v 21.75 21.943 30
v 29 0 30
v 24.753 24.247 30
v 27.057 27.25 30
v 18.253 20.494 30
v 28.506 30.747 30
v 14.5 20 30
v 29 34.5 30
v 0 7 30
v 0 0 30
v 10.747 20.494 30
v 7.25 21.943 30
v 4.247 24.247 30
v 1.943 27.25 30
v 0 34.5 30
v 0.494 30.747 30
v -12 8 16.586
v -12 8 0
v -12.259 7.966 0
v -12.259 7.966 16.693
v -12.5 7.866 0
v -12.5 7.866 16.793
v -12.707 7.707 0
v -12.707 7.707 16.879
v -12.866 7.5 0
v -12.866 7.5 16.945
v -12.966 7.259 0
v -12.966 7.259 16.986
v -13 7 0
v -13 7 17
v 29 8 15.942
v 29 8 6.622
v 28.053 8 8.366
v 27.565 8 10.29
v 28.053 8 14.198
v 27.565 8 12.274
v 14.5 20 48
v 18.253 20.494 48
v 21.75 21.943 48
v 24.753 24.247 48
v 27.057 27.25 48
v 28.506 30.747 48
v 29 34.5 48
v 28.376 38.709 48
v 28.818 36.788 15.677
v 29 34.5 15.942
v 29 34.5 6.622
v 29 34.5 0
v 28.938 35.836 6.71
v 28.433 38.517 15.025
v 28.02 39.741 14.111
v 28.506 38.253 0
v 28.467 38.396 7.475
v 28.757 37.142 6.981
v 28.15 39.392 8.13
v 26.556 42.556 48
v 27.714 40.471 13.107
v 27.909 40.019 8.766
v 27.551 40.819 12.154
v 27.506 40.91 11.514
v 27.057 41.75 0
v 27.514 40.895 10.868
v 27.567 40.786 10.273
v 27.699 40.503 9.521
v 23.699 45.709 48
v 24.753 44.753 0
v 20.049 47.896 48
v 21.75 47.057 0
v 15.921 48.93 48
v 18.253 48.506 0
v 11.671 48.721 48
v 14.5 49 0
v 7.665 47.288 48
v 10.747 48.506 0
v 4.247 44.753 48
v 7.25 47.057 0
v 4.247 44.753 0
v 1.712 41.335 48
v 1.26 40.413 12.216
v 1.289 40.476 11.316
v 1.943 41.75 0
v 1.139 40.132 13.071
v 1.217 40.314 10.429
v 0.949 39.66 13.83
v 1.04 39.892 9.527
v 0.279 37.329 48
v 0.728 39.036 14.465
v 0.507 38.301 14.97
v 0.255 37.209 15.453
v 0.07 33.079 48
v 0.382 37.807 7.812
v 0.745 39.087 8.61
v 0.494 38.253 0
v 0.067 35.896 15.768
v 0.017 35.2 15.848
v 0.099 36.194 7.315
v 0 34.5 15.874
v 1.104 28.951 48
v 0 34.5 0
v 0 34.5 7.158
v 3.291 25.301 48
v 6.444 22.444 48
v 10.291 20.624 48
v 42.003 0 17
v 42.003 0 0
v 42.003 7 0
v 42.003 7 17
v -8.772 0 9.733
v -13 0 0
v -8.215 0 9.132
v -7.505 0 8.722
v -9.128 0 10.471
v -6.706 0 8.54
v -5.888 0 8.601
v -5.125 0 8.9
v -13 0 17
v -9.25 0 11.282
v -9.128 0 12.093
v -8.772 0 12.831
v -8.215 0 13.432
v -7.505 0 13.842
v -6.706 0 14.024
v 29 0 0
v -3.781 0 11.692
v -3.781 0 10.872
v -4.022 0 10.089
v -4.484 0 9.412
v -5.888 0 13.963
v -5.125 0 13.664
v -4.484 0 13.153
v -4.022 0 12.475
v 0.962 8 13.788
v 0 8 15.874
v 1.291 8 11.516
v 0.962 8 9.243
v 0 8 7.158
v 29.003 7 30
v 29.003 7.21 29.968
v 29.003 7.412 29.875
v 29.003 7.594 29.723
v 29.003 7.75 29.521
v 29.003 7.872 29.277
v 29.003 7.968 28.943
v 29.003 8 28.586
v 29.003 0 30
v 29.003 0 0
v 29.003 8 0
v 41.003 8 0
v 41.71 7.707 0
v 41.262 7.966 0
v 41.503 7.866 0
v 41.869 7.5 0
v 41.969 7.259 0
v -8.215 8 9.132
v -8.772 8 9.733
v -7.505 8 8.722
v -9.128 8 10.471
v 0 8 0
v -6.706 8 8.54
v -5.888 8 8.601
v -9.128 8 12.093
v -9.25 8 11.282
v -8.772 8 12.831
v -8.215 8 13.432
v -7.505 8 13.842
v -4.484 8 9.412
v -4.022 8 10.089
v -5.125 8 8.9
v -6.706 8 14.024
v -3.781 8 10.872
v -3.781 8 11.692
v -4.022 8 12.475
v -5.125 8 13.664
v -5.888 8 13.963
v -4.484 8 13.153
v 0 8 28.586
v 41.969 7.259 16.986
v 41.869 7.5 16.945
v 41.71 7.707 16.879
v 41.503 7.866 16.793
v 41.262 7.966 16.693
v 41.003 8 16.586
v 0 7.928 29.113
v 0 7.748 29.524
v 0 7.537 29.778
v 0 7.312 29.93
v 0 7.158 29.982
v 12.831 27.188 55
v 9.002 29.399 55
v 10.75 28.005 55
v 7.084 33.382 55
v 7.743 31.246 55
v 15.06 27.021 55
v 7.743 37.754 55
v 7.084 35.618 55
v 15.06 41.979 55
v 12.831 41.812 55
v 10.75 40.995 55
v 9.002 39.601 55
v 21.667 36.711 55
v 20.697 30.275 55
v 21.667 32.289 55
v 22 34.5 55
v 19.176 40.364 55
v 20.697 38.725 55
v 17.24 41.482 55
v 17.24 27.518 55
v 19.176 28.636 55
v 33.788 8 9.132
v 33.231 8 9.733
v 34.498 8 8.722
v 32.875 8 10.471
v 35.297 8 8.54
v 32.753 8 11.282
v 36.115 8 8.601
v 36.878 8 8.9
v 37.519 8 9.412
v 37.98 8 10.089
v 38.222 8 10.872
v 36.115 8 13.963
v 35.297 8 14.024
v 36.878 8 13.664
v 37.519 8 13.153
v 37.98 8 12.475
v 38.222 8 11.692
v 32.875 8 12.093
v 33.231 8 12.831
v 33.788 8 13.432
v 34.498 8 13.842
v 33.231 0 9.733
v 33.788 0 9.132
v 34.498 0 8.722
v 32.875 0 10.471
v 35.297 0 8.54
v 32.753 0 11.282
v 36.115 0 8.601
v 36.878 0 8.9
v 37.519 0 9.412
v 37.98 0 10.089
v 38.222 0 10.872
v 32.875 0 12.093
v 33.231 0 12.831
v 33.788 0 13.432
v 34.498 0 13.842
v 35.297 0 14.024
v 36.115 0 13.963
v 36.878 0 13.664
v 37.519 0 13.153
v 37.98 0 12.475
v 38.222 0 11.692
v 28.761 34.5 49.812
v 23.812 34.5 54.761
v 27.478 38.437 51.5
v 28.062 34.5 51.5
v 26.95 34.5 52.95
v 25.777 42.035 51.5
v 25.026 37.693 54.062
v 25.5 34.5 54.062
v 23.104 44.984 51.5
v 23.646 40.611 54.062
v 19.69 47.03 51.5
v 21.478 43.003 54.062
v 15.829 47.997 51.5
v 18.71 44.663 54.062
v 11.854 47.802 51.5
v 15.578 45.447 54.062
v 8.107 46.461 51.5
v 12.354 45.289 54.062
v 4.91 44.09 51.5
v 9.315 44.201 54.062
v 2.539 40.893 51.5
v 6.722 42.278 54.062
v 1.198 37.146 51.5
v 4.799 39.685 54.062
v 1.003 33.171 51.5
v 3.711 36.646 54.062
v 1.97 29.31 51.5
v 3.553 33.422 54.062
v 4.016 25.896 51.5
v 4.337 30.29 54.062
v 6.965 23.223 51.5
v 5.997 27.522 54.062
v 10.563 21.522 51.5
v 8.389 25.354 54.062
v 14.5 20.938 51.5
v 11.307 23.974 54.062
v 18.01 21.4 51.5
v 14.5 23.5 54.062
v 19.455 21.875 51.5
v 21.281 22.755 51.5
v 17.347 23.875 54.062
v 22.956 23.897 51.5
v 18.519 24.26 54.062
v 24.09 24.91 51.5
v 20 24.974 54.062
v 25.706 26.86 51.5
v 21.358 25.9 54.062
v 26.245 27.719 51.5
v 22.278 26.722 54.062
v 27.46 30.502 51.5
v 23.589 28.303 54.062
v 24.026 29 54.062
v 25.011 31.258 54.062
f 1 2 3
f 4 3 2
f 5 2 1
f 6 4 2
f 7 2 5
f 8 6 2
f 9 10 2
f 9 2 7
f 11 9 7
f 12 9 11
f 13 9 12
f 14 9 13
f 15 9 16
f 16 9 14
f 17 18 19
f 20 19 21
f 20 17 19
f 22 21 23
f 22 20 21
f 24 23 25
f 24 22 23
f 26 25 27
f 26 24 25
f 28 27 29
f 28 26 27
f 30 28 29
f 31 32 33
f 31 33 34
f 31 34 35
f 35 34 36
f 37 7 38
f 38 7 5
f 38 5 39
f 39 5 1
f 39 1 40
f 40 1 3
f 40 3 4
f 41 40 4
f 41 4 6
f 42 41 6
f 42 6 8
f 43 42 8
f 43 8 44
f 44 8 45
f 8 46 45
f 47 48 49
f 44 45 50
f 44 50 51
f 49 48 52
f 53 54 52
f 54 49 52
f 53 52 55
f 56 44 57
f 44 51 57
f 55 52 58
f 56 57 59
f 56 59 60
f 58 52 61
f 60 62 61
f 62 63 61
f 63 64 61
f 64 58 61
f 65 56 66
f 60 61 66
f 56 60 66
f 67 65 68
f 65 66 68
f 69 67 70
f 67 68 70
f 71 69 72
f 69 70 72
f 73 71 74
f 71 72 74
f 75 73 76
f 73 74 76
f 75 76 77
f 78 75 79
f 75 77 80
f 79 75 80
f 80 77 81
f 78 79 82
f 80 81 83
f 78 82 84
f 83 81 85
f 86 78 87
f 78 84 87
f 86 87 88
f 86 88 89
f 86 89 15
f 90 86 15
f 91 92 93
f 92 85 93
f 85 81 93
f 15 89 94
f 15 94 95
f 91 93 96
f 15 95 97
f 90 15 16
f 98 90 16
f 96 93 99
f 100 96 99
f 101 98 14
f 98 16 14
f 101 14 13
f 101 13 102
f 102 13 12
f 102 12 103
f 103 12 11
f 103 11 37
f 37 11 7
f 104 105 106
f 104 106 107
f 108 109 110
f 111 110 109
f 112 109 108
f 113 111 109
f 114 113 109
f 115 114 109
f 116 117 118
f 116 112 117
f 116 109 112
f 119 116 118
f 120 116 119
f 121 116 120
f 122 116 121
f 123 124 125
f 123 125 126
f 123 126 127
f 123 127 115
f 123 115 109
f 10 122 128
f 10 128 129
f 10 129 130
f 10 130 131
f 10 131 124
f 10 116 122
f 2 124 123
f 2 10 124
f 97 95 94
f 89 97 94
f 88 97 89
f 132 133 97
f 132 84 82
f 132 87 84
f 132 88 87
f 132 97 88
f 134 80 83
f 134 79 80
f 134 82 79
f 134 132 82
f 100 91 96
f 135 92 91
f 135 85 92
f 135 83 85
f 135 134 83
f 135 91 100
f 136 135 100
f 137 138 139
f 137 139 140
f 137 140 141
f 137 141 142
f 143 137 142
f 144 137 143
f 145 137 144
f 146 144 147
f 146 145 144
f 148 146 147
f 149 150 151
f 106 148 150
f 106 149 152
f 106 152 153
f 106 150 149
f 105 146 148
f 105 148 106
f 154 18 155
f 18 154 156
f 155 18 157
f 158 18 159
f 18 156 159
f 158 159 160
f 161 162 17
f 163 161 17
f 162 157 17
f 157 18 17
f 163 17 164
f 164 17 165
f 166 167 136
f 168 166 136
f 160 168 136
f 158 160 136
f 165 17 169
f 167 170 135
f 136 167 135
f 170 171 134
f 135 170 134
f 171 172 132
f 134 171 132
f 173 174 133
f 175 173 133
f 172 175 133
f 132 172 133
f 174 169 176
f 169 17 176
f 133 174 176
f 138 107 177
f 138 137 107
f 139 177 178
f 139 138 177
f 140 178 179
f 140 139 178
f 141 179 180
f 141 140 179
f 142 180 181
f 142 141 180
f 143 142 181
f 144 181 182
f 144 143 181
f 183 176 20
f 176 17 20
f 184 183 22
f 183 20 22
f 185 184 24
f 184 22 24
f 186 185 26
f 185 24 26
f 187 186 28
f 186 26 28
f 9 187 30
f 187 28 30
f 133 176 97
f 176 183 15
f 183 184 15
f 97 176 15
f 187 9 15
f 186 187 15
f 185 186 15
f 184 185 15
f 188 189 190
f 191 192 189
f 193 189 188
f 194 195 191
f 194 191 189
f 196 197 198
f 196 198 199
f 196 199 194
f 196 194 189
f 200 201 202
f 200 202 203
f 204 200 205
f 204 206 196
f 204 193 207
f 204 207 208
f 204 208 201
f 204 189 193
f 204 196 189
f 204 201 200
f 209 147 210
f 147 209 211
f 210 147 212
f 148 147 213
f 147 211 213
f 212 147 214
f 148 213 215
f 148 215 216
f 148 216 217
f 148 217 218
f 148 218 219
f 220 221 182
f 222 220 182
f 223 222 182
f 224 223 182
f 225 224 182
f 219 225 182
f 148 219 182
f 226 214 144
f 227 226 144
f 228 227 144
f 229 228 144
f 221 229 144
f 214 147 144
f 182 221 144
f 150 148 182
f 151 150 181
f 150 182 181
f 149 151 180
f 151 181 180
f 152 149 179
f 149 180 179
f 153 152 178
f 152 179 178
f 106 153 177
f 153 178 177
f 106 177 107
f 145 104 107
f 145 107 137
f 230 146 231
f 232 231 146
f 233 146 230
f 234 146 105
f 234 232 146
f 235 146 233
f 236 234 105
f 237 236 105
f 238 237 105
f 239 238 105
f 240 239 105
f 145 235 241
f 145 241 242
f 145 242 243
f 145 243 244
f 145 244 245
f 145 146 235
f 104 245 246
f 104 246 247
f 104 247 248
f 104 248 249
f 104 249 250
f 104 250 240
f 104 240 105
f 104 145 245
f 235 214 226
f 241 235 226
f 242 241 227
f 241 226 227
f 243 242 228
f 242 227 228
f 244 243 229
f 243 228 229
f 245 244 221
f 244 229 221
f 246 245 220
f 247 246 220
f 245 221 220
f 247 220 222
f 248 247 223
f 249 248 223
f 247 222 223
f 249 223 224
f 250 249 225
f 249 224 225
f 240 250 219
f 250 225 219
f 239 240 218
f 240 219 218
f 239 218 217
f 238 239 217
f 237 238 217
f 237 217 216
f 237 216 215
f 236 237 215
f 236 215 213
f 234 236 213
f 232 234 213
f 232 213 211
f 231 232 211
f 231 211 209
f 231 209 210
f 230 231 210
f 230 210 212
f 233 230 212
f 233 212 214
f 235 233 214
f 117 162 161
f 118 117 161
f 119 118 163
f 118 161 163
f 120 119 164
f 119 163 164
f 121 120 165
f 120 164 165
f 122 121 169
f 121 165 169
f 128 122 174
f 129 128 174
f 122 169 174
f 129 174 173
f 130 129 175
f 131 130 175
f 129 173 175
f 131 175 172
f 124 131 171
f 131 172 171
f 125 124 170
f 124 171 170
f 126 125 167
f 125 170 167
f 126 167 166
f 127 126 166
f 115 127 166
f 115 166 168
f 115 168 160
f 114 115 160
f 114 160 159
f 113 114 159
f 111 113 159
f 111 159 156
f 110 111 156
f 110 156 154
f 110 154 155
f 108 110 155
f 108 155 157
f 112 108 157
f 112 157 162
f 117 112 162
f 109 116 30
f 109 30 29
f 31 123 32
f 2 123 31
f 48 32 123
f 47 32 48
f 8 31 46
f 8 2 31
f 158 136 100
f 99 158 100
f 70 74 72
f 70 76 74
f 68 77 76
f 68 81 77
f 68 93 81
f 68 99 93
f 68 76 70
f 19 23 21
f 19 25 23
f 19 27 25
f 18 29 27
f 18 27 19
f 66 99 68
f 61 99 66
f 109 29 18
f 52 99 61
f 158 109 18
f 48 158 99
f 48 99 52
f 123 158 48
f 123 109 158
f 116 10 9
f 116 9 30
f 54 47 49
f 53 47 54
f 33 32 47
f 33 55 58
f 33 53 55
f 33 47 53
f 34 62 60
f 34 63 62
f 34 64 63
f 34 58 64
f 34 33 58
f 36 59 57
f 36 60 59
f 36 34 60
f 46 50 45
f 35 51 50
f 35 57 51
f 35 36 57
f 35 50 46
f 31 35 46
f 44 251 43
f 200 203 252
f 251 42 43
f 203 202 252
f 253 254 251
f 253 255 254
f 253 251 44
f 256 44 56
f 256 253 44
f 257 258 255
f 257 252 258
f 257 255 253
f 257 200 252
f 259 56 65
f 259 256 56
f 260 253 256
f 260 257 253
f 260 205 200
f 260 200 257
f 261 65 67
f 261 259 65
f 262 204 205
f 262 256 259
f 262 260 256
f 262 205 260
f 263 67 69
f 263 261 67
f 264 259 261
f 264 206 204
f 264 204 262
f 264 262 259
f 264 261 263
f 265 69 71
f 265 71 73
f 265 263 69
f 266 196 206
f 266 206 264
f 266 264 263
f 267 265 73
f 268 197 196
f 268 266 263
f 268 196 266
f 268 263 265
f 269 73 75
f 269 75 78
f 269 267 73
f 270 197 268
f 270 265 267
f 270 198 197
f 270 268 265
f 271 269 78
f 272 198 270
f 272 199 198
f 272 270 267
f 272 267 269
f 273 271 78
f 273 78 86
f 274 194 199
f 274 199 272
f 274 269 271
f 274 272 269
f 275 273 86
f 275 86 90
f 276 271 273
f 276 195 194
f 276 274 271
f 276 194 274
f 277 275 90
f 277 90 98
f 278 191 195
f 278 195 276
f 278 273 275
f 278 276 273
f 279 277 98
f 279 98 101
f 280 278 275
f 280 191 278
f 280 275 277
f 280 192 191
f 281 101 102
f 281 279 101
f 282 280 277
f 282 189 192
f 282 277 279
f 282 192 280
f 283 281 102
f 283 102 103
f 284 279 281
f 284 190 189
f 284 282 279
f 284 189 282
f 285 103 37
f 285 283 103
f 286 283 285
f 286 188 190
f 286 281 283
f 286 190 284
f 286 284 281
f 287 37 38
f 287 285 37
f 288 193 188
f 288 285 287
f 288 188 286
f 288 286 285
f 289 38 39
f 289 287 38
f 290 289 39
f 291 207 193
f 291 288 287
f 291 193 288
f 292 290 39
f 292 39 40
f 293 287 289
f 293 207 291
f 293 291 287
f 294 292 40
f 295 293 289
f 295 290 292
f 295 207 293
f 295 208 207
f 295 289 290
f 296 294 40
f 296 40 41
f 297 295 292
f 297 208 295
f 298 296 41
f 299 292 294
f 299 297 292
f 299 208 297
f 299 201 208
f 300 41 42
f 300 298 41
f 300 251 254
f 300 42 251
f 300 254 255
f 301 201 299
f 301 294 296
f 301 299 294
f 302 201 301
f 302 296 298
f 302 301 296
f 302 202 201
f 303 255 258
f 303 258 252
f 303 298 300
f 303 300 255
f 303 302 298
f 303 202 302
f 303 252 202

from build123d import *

# Parameters (mm, degrees)
F0_W      = 49
F0_H      = 30
F1_DEPTH  = 29
F3_DEPTH  = 8
F5_DEPTH  = 25
F6_DEPTH  = 30
F8_R      = 2.75
F9_DEPTH  = 25
F10_R     = 8
F11_DEPTH = 40
F12_R     = 1
F12_2_R   = 1


# Not quite as in the source:
# - a fillet or chamfer that OpenCascade refuses, or shapes differently, is made with other operations: its cross-section is extruded or revolved along the edge and cut away or added


with BuildPart() as f1:
    # F0 (on Right) → F1 (new body)
    with BuildSketch(Plane.YZ):
        with Locations((24.5, 15)):
            Rectangle(F0_W, F0_H)
    extrude(amount=F1_DEPTH)

    # F2 (on Front) → F3 (join)
    with BuildSketch(Plane.XZ):
        Polygon((-13, 0), (0, 0), (0, 30), (-13, 17), align=None)
    extrude(amount=-F3_DEPTH)

    # F4 (on face) → F5 (join)
    with BuildSketch(Plane.XY.offset(30)):
        with BuildLine():
            ThreePointArc((29, 34.5), (24.7530483272, 44.7530483272), (14.5, 49))
            Line((14.5, 49), (14.5, 20))
            ThreePointArc((14.5, 20), (24.7530483272, 24.2469516728), (29, 34.5))
        make_face()
        with BuildLine():
            Line((14.5, 20), (14.5, 49))
            ThreePointArc((14.5, 49), (0, 34.5), (14.5, 20))
        make_face()
    extrude(amount=F5_DEPTH)

    # F6 (cut): faces of the model
    f6_faces = [f1.faces().sort_by_distance(p)[0] for p in [
        (25.7611648853, 45.7611648853, 30),
        (3.2388351147, 45.7611648853, 30),
    ]]
    extrude(f6_faces, amount=-F6_DEPTH, mode=Mode.SUBTRACT)

    # F7: fillet of radius 7 on 1 edges, made by hand

    # F7_s1 → F7_t2 (revolve, cut)
    with BuildSketch(Plane.XZ.offset(-34.5)):
        with BuildLine():
            ThreePointArc((29, 48), (26.9497474683, 52.9497474683), (22, 55))
            Line((22, 55), (29, 55))
            Line((29, 55), (29, 48))
        make_face()
    revolve(axis=Axis((14.5, 34.5, 55), (0, 0, 1)), mode=Mode.SUBTRACT)


with BuildPart() as f3:
    # F2 (on Front) → F3, piece 2 (new body)
    with BuildSketch(Plane.XZ):
        Polygon((29.0028285235, 30), (29.0028285235, 0), (42.0028285235, 0), (42.0028285235, 17), align=None)
    extrude(amount=-F3_DEPTH)


with BuildPart() as f9_tool:
    # F8 (on face) → F9 (new body)
    with BuildSketch(Plane(origin=(0, 8, 0), x_dir=(-1, 0, 0), z_dir=(0, 1, 0))):
        with Locations((-35.5028285235, 11.2820267677)):
            Circle(F8_R)
        with Locations((6.5, 11.2820267677)):
            Circle(F8_R)
    extrude(amount=-F9_DEPTH)


with BuildPart() as f1_1:
    add(f1.part)

    # F9: cut by f9_tool
    add(f9_tool.part, mode=Mode.SUBTRACT)

    # F10 (on face) → F11 (cut)
    with BuildSketch(Plane(origin=(0, 8, 0), x_dir=(-1, 0, 0), z_dir=(0, 1, 0))):
        with Locations((-35.5028285235, 11.2820267677)):
            Circle(F10_R)
        with Locations((6.708932967, 11.5158854604)):
            Circle(F10_R)
    extrude(amount=F11_DEPTH, mode=Mode.SUBTRACT)

    # F12
    f12_edges = [f1_1.edges().sort_by_distance(p)[0] for p in [
        (-6.5, 8, 23.5),
        (-13, 8, 8.5),
    ]]
    fillet(f12_edges, radius=F12_R)


with BuildPart() as f3_1:
    add(f3.part)

    # F9: cut by f9_tool
    add(f9_tool.part, mode=Mode.SUBTRACT)

    # F12#2
    f12_2_edges = [f3_1.edges().sort_by_distance(p)[0] for p in [
        (35.502829, 8, 23.5),
        (42.002829, 8, 8.5),
    ]]
    fillet(f12_2_edges, radius=F12_2_R)


solid = Compound([f1_1.part, f3_1.part])
